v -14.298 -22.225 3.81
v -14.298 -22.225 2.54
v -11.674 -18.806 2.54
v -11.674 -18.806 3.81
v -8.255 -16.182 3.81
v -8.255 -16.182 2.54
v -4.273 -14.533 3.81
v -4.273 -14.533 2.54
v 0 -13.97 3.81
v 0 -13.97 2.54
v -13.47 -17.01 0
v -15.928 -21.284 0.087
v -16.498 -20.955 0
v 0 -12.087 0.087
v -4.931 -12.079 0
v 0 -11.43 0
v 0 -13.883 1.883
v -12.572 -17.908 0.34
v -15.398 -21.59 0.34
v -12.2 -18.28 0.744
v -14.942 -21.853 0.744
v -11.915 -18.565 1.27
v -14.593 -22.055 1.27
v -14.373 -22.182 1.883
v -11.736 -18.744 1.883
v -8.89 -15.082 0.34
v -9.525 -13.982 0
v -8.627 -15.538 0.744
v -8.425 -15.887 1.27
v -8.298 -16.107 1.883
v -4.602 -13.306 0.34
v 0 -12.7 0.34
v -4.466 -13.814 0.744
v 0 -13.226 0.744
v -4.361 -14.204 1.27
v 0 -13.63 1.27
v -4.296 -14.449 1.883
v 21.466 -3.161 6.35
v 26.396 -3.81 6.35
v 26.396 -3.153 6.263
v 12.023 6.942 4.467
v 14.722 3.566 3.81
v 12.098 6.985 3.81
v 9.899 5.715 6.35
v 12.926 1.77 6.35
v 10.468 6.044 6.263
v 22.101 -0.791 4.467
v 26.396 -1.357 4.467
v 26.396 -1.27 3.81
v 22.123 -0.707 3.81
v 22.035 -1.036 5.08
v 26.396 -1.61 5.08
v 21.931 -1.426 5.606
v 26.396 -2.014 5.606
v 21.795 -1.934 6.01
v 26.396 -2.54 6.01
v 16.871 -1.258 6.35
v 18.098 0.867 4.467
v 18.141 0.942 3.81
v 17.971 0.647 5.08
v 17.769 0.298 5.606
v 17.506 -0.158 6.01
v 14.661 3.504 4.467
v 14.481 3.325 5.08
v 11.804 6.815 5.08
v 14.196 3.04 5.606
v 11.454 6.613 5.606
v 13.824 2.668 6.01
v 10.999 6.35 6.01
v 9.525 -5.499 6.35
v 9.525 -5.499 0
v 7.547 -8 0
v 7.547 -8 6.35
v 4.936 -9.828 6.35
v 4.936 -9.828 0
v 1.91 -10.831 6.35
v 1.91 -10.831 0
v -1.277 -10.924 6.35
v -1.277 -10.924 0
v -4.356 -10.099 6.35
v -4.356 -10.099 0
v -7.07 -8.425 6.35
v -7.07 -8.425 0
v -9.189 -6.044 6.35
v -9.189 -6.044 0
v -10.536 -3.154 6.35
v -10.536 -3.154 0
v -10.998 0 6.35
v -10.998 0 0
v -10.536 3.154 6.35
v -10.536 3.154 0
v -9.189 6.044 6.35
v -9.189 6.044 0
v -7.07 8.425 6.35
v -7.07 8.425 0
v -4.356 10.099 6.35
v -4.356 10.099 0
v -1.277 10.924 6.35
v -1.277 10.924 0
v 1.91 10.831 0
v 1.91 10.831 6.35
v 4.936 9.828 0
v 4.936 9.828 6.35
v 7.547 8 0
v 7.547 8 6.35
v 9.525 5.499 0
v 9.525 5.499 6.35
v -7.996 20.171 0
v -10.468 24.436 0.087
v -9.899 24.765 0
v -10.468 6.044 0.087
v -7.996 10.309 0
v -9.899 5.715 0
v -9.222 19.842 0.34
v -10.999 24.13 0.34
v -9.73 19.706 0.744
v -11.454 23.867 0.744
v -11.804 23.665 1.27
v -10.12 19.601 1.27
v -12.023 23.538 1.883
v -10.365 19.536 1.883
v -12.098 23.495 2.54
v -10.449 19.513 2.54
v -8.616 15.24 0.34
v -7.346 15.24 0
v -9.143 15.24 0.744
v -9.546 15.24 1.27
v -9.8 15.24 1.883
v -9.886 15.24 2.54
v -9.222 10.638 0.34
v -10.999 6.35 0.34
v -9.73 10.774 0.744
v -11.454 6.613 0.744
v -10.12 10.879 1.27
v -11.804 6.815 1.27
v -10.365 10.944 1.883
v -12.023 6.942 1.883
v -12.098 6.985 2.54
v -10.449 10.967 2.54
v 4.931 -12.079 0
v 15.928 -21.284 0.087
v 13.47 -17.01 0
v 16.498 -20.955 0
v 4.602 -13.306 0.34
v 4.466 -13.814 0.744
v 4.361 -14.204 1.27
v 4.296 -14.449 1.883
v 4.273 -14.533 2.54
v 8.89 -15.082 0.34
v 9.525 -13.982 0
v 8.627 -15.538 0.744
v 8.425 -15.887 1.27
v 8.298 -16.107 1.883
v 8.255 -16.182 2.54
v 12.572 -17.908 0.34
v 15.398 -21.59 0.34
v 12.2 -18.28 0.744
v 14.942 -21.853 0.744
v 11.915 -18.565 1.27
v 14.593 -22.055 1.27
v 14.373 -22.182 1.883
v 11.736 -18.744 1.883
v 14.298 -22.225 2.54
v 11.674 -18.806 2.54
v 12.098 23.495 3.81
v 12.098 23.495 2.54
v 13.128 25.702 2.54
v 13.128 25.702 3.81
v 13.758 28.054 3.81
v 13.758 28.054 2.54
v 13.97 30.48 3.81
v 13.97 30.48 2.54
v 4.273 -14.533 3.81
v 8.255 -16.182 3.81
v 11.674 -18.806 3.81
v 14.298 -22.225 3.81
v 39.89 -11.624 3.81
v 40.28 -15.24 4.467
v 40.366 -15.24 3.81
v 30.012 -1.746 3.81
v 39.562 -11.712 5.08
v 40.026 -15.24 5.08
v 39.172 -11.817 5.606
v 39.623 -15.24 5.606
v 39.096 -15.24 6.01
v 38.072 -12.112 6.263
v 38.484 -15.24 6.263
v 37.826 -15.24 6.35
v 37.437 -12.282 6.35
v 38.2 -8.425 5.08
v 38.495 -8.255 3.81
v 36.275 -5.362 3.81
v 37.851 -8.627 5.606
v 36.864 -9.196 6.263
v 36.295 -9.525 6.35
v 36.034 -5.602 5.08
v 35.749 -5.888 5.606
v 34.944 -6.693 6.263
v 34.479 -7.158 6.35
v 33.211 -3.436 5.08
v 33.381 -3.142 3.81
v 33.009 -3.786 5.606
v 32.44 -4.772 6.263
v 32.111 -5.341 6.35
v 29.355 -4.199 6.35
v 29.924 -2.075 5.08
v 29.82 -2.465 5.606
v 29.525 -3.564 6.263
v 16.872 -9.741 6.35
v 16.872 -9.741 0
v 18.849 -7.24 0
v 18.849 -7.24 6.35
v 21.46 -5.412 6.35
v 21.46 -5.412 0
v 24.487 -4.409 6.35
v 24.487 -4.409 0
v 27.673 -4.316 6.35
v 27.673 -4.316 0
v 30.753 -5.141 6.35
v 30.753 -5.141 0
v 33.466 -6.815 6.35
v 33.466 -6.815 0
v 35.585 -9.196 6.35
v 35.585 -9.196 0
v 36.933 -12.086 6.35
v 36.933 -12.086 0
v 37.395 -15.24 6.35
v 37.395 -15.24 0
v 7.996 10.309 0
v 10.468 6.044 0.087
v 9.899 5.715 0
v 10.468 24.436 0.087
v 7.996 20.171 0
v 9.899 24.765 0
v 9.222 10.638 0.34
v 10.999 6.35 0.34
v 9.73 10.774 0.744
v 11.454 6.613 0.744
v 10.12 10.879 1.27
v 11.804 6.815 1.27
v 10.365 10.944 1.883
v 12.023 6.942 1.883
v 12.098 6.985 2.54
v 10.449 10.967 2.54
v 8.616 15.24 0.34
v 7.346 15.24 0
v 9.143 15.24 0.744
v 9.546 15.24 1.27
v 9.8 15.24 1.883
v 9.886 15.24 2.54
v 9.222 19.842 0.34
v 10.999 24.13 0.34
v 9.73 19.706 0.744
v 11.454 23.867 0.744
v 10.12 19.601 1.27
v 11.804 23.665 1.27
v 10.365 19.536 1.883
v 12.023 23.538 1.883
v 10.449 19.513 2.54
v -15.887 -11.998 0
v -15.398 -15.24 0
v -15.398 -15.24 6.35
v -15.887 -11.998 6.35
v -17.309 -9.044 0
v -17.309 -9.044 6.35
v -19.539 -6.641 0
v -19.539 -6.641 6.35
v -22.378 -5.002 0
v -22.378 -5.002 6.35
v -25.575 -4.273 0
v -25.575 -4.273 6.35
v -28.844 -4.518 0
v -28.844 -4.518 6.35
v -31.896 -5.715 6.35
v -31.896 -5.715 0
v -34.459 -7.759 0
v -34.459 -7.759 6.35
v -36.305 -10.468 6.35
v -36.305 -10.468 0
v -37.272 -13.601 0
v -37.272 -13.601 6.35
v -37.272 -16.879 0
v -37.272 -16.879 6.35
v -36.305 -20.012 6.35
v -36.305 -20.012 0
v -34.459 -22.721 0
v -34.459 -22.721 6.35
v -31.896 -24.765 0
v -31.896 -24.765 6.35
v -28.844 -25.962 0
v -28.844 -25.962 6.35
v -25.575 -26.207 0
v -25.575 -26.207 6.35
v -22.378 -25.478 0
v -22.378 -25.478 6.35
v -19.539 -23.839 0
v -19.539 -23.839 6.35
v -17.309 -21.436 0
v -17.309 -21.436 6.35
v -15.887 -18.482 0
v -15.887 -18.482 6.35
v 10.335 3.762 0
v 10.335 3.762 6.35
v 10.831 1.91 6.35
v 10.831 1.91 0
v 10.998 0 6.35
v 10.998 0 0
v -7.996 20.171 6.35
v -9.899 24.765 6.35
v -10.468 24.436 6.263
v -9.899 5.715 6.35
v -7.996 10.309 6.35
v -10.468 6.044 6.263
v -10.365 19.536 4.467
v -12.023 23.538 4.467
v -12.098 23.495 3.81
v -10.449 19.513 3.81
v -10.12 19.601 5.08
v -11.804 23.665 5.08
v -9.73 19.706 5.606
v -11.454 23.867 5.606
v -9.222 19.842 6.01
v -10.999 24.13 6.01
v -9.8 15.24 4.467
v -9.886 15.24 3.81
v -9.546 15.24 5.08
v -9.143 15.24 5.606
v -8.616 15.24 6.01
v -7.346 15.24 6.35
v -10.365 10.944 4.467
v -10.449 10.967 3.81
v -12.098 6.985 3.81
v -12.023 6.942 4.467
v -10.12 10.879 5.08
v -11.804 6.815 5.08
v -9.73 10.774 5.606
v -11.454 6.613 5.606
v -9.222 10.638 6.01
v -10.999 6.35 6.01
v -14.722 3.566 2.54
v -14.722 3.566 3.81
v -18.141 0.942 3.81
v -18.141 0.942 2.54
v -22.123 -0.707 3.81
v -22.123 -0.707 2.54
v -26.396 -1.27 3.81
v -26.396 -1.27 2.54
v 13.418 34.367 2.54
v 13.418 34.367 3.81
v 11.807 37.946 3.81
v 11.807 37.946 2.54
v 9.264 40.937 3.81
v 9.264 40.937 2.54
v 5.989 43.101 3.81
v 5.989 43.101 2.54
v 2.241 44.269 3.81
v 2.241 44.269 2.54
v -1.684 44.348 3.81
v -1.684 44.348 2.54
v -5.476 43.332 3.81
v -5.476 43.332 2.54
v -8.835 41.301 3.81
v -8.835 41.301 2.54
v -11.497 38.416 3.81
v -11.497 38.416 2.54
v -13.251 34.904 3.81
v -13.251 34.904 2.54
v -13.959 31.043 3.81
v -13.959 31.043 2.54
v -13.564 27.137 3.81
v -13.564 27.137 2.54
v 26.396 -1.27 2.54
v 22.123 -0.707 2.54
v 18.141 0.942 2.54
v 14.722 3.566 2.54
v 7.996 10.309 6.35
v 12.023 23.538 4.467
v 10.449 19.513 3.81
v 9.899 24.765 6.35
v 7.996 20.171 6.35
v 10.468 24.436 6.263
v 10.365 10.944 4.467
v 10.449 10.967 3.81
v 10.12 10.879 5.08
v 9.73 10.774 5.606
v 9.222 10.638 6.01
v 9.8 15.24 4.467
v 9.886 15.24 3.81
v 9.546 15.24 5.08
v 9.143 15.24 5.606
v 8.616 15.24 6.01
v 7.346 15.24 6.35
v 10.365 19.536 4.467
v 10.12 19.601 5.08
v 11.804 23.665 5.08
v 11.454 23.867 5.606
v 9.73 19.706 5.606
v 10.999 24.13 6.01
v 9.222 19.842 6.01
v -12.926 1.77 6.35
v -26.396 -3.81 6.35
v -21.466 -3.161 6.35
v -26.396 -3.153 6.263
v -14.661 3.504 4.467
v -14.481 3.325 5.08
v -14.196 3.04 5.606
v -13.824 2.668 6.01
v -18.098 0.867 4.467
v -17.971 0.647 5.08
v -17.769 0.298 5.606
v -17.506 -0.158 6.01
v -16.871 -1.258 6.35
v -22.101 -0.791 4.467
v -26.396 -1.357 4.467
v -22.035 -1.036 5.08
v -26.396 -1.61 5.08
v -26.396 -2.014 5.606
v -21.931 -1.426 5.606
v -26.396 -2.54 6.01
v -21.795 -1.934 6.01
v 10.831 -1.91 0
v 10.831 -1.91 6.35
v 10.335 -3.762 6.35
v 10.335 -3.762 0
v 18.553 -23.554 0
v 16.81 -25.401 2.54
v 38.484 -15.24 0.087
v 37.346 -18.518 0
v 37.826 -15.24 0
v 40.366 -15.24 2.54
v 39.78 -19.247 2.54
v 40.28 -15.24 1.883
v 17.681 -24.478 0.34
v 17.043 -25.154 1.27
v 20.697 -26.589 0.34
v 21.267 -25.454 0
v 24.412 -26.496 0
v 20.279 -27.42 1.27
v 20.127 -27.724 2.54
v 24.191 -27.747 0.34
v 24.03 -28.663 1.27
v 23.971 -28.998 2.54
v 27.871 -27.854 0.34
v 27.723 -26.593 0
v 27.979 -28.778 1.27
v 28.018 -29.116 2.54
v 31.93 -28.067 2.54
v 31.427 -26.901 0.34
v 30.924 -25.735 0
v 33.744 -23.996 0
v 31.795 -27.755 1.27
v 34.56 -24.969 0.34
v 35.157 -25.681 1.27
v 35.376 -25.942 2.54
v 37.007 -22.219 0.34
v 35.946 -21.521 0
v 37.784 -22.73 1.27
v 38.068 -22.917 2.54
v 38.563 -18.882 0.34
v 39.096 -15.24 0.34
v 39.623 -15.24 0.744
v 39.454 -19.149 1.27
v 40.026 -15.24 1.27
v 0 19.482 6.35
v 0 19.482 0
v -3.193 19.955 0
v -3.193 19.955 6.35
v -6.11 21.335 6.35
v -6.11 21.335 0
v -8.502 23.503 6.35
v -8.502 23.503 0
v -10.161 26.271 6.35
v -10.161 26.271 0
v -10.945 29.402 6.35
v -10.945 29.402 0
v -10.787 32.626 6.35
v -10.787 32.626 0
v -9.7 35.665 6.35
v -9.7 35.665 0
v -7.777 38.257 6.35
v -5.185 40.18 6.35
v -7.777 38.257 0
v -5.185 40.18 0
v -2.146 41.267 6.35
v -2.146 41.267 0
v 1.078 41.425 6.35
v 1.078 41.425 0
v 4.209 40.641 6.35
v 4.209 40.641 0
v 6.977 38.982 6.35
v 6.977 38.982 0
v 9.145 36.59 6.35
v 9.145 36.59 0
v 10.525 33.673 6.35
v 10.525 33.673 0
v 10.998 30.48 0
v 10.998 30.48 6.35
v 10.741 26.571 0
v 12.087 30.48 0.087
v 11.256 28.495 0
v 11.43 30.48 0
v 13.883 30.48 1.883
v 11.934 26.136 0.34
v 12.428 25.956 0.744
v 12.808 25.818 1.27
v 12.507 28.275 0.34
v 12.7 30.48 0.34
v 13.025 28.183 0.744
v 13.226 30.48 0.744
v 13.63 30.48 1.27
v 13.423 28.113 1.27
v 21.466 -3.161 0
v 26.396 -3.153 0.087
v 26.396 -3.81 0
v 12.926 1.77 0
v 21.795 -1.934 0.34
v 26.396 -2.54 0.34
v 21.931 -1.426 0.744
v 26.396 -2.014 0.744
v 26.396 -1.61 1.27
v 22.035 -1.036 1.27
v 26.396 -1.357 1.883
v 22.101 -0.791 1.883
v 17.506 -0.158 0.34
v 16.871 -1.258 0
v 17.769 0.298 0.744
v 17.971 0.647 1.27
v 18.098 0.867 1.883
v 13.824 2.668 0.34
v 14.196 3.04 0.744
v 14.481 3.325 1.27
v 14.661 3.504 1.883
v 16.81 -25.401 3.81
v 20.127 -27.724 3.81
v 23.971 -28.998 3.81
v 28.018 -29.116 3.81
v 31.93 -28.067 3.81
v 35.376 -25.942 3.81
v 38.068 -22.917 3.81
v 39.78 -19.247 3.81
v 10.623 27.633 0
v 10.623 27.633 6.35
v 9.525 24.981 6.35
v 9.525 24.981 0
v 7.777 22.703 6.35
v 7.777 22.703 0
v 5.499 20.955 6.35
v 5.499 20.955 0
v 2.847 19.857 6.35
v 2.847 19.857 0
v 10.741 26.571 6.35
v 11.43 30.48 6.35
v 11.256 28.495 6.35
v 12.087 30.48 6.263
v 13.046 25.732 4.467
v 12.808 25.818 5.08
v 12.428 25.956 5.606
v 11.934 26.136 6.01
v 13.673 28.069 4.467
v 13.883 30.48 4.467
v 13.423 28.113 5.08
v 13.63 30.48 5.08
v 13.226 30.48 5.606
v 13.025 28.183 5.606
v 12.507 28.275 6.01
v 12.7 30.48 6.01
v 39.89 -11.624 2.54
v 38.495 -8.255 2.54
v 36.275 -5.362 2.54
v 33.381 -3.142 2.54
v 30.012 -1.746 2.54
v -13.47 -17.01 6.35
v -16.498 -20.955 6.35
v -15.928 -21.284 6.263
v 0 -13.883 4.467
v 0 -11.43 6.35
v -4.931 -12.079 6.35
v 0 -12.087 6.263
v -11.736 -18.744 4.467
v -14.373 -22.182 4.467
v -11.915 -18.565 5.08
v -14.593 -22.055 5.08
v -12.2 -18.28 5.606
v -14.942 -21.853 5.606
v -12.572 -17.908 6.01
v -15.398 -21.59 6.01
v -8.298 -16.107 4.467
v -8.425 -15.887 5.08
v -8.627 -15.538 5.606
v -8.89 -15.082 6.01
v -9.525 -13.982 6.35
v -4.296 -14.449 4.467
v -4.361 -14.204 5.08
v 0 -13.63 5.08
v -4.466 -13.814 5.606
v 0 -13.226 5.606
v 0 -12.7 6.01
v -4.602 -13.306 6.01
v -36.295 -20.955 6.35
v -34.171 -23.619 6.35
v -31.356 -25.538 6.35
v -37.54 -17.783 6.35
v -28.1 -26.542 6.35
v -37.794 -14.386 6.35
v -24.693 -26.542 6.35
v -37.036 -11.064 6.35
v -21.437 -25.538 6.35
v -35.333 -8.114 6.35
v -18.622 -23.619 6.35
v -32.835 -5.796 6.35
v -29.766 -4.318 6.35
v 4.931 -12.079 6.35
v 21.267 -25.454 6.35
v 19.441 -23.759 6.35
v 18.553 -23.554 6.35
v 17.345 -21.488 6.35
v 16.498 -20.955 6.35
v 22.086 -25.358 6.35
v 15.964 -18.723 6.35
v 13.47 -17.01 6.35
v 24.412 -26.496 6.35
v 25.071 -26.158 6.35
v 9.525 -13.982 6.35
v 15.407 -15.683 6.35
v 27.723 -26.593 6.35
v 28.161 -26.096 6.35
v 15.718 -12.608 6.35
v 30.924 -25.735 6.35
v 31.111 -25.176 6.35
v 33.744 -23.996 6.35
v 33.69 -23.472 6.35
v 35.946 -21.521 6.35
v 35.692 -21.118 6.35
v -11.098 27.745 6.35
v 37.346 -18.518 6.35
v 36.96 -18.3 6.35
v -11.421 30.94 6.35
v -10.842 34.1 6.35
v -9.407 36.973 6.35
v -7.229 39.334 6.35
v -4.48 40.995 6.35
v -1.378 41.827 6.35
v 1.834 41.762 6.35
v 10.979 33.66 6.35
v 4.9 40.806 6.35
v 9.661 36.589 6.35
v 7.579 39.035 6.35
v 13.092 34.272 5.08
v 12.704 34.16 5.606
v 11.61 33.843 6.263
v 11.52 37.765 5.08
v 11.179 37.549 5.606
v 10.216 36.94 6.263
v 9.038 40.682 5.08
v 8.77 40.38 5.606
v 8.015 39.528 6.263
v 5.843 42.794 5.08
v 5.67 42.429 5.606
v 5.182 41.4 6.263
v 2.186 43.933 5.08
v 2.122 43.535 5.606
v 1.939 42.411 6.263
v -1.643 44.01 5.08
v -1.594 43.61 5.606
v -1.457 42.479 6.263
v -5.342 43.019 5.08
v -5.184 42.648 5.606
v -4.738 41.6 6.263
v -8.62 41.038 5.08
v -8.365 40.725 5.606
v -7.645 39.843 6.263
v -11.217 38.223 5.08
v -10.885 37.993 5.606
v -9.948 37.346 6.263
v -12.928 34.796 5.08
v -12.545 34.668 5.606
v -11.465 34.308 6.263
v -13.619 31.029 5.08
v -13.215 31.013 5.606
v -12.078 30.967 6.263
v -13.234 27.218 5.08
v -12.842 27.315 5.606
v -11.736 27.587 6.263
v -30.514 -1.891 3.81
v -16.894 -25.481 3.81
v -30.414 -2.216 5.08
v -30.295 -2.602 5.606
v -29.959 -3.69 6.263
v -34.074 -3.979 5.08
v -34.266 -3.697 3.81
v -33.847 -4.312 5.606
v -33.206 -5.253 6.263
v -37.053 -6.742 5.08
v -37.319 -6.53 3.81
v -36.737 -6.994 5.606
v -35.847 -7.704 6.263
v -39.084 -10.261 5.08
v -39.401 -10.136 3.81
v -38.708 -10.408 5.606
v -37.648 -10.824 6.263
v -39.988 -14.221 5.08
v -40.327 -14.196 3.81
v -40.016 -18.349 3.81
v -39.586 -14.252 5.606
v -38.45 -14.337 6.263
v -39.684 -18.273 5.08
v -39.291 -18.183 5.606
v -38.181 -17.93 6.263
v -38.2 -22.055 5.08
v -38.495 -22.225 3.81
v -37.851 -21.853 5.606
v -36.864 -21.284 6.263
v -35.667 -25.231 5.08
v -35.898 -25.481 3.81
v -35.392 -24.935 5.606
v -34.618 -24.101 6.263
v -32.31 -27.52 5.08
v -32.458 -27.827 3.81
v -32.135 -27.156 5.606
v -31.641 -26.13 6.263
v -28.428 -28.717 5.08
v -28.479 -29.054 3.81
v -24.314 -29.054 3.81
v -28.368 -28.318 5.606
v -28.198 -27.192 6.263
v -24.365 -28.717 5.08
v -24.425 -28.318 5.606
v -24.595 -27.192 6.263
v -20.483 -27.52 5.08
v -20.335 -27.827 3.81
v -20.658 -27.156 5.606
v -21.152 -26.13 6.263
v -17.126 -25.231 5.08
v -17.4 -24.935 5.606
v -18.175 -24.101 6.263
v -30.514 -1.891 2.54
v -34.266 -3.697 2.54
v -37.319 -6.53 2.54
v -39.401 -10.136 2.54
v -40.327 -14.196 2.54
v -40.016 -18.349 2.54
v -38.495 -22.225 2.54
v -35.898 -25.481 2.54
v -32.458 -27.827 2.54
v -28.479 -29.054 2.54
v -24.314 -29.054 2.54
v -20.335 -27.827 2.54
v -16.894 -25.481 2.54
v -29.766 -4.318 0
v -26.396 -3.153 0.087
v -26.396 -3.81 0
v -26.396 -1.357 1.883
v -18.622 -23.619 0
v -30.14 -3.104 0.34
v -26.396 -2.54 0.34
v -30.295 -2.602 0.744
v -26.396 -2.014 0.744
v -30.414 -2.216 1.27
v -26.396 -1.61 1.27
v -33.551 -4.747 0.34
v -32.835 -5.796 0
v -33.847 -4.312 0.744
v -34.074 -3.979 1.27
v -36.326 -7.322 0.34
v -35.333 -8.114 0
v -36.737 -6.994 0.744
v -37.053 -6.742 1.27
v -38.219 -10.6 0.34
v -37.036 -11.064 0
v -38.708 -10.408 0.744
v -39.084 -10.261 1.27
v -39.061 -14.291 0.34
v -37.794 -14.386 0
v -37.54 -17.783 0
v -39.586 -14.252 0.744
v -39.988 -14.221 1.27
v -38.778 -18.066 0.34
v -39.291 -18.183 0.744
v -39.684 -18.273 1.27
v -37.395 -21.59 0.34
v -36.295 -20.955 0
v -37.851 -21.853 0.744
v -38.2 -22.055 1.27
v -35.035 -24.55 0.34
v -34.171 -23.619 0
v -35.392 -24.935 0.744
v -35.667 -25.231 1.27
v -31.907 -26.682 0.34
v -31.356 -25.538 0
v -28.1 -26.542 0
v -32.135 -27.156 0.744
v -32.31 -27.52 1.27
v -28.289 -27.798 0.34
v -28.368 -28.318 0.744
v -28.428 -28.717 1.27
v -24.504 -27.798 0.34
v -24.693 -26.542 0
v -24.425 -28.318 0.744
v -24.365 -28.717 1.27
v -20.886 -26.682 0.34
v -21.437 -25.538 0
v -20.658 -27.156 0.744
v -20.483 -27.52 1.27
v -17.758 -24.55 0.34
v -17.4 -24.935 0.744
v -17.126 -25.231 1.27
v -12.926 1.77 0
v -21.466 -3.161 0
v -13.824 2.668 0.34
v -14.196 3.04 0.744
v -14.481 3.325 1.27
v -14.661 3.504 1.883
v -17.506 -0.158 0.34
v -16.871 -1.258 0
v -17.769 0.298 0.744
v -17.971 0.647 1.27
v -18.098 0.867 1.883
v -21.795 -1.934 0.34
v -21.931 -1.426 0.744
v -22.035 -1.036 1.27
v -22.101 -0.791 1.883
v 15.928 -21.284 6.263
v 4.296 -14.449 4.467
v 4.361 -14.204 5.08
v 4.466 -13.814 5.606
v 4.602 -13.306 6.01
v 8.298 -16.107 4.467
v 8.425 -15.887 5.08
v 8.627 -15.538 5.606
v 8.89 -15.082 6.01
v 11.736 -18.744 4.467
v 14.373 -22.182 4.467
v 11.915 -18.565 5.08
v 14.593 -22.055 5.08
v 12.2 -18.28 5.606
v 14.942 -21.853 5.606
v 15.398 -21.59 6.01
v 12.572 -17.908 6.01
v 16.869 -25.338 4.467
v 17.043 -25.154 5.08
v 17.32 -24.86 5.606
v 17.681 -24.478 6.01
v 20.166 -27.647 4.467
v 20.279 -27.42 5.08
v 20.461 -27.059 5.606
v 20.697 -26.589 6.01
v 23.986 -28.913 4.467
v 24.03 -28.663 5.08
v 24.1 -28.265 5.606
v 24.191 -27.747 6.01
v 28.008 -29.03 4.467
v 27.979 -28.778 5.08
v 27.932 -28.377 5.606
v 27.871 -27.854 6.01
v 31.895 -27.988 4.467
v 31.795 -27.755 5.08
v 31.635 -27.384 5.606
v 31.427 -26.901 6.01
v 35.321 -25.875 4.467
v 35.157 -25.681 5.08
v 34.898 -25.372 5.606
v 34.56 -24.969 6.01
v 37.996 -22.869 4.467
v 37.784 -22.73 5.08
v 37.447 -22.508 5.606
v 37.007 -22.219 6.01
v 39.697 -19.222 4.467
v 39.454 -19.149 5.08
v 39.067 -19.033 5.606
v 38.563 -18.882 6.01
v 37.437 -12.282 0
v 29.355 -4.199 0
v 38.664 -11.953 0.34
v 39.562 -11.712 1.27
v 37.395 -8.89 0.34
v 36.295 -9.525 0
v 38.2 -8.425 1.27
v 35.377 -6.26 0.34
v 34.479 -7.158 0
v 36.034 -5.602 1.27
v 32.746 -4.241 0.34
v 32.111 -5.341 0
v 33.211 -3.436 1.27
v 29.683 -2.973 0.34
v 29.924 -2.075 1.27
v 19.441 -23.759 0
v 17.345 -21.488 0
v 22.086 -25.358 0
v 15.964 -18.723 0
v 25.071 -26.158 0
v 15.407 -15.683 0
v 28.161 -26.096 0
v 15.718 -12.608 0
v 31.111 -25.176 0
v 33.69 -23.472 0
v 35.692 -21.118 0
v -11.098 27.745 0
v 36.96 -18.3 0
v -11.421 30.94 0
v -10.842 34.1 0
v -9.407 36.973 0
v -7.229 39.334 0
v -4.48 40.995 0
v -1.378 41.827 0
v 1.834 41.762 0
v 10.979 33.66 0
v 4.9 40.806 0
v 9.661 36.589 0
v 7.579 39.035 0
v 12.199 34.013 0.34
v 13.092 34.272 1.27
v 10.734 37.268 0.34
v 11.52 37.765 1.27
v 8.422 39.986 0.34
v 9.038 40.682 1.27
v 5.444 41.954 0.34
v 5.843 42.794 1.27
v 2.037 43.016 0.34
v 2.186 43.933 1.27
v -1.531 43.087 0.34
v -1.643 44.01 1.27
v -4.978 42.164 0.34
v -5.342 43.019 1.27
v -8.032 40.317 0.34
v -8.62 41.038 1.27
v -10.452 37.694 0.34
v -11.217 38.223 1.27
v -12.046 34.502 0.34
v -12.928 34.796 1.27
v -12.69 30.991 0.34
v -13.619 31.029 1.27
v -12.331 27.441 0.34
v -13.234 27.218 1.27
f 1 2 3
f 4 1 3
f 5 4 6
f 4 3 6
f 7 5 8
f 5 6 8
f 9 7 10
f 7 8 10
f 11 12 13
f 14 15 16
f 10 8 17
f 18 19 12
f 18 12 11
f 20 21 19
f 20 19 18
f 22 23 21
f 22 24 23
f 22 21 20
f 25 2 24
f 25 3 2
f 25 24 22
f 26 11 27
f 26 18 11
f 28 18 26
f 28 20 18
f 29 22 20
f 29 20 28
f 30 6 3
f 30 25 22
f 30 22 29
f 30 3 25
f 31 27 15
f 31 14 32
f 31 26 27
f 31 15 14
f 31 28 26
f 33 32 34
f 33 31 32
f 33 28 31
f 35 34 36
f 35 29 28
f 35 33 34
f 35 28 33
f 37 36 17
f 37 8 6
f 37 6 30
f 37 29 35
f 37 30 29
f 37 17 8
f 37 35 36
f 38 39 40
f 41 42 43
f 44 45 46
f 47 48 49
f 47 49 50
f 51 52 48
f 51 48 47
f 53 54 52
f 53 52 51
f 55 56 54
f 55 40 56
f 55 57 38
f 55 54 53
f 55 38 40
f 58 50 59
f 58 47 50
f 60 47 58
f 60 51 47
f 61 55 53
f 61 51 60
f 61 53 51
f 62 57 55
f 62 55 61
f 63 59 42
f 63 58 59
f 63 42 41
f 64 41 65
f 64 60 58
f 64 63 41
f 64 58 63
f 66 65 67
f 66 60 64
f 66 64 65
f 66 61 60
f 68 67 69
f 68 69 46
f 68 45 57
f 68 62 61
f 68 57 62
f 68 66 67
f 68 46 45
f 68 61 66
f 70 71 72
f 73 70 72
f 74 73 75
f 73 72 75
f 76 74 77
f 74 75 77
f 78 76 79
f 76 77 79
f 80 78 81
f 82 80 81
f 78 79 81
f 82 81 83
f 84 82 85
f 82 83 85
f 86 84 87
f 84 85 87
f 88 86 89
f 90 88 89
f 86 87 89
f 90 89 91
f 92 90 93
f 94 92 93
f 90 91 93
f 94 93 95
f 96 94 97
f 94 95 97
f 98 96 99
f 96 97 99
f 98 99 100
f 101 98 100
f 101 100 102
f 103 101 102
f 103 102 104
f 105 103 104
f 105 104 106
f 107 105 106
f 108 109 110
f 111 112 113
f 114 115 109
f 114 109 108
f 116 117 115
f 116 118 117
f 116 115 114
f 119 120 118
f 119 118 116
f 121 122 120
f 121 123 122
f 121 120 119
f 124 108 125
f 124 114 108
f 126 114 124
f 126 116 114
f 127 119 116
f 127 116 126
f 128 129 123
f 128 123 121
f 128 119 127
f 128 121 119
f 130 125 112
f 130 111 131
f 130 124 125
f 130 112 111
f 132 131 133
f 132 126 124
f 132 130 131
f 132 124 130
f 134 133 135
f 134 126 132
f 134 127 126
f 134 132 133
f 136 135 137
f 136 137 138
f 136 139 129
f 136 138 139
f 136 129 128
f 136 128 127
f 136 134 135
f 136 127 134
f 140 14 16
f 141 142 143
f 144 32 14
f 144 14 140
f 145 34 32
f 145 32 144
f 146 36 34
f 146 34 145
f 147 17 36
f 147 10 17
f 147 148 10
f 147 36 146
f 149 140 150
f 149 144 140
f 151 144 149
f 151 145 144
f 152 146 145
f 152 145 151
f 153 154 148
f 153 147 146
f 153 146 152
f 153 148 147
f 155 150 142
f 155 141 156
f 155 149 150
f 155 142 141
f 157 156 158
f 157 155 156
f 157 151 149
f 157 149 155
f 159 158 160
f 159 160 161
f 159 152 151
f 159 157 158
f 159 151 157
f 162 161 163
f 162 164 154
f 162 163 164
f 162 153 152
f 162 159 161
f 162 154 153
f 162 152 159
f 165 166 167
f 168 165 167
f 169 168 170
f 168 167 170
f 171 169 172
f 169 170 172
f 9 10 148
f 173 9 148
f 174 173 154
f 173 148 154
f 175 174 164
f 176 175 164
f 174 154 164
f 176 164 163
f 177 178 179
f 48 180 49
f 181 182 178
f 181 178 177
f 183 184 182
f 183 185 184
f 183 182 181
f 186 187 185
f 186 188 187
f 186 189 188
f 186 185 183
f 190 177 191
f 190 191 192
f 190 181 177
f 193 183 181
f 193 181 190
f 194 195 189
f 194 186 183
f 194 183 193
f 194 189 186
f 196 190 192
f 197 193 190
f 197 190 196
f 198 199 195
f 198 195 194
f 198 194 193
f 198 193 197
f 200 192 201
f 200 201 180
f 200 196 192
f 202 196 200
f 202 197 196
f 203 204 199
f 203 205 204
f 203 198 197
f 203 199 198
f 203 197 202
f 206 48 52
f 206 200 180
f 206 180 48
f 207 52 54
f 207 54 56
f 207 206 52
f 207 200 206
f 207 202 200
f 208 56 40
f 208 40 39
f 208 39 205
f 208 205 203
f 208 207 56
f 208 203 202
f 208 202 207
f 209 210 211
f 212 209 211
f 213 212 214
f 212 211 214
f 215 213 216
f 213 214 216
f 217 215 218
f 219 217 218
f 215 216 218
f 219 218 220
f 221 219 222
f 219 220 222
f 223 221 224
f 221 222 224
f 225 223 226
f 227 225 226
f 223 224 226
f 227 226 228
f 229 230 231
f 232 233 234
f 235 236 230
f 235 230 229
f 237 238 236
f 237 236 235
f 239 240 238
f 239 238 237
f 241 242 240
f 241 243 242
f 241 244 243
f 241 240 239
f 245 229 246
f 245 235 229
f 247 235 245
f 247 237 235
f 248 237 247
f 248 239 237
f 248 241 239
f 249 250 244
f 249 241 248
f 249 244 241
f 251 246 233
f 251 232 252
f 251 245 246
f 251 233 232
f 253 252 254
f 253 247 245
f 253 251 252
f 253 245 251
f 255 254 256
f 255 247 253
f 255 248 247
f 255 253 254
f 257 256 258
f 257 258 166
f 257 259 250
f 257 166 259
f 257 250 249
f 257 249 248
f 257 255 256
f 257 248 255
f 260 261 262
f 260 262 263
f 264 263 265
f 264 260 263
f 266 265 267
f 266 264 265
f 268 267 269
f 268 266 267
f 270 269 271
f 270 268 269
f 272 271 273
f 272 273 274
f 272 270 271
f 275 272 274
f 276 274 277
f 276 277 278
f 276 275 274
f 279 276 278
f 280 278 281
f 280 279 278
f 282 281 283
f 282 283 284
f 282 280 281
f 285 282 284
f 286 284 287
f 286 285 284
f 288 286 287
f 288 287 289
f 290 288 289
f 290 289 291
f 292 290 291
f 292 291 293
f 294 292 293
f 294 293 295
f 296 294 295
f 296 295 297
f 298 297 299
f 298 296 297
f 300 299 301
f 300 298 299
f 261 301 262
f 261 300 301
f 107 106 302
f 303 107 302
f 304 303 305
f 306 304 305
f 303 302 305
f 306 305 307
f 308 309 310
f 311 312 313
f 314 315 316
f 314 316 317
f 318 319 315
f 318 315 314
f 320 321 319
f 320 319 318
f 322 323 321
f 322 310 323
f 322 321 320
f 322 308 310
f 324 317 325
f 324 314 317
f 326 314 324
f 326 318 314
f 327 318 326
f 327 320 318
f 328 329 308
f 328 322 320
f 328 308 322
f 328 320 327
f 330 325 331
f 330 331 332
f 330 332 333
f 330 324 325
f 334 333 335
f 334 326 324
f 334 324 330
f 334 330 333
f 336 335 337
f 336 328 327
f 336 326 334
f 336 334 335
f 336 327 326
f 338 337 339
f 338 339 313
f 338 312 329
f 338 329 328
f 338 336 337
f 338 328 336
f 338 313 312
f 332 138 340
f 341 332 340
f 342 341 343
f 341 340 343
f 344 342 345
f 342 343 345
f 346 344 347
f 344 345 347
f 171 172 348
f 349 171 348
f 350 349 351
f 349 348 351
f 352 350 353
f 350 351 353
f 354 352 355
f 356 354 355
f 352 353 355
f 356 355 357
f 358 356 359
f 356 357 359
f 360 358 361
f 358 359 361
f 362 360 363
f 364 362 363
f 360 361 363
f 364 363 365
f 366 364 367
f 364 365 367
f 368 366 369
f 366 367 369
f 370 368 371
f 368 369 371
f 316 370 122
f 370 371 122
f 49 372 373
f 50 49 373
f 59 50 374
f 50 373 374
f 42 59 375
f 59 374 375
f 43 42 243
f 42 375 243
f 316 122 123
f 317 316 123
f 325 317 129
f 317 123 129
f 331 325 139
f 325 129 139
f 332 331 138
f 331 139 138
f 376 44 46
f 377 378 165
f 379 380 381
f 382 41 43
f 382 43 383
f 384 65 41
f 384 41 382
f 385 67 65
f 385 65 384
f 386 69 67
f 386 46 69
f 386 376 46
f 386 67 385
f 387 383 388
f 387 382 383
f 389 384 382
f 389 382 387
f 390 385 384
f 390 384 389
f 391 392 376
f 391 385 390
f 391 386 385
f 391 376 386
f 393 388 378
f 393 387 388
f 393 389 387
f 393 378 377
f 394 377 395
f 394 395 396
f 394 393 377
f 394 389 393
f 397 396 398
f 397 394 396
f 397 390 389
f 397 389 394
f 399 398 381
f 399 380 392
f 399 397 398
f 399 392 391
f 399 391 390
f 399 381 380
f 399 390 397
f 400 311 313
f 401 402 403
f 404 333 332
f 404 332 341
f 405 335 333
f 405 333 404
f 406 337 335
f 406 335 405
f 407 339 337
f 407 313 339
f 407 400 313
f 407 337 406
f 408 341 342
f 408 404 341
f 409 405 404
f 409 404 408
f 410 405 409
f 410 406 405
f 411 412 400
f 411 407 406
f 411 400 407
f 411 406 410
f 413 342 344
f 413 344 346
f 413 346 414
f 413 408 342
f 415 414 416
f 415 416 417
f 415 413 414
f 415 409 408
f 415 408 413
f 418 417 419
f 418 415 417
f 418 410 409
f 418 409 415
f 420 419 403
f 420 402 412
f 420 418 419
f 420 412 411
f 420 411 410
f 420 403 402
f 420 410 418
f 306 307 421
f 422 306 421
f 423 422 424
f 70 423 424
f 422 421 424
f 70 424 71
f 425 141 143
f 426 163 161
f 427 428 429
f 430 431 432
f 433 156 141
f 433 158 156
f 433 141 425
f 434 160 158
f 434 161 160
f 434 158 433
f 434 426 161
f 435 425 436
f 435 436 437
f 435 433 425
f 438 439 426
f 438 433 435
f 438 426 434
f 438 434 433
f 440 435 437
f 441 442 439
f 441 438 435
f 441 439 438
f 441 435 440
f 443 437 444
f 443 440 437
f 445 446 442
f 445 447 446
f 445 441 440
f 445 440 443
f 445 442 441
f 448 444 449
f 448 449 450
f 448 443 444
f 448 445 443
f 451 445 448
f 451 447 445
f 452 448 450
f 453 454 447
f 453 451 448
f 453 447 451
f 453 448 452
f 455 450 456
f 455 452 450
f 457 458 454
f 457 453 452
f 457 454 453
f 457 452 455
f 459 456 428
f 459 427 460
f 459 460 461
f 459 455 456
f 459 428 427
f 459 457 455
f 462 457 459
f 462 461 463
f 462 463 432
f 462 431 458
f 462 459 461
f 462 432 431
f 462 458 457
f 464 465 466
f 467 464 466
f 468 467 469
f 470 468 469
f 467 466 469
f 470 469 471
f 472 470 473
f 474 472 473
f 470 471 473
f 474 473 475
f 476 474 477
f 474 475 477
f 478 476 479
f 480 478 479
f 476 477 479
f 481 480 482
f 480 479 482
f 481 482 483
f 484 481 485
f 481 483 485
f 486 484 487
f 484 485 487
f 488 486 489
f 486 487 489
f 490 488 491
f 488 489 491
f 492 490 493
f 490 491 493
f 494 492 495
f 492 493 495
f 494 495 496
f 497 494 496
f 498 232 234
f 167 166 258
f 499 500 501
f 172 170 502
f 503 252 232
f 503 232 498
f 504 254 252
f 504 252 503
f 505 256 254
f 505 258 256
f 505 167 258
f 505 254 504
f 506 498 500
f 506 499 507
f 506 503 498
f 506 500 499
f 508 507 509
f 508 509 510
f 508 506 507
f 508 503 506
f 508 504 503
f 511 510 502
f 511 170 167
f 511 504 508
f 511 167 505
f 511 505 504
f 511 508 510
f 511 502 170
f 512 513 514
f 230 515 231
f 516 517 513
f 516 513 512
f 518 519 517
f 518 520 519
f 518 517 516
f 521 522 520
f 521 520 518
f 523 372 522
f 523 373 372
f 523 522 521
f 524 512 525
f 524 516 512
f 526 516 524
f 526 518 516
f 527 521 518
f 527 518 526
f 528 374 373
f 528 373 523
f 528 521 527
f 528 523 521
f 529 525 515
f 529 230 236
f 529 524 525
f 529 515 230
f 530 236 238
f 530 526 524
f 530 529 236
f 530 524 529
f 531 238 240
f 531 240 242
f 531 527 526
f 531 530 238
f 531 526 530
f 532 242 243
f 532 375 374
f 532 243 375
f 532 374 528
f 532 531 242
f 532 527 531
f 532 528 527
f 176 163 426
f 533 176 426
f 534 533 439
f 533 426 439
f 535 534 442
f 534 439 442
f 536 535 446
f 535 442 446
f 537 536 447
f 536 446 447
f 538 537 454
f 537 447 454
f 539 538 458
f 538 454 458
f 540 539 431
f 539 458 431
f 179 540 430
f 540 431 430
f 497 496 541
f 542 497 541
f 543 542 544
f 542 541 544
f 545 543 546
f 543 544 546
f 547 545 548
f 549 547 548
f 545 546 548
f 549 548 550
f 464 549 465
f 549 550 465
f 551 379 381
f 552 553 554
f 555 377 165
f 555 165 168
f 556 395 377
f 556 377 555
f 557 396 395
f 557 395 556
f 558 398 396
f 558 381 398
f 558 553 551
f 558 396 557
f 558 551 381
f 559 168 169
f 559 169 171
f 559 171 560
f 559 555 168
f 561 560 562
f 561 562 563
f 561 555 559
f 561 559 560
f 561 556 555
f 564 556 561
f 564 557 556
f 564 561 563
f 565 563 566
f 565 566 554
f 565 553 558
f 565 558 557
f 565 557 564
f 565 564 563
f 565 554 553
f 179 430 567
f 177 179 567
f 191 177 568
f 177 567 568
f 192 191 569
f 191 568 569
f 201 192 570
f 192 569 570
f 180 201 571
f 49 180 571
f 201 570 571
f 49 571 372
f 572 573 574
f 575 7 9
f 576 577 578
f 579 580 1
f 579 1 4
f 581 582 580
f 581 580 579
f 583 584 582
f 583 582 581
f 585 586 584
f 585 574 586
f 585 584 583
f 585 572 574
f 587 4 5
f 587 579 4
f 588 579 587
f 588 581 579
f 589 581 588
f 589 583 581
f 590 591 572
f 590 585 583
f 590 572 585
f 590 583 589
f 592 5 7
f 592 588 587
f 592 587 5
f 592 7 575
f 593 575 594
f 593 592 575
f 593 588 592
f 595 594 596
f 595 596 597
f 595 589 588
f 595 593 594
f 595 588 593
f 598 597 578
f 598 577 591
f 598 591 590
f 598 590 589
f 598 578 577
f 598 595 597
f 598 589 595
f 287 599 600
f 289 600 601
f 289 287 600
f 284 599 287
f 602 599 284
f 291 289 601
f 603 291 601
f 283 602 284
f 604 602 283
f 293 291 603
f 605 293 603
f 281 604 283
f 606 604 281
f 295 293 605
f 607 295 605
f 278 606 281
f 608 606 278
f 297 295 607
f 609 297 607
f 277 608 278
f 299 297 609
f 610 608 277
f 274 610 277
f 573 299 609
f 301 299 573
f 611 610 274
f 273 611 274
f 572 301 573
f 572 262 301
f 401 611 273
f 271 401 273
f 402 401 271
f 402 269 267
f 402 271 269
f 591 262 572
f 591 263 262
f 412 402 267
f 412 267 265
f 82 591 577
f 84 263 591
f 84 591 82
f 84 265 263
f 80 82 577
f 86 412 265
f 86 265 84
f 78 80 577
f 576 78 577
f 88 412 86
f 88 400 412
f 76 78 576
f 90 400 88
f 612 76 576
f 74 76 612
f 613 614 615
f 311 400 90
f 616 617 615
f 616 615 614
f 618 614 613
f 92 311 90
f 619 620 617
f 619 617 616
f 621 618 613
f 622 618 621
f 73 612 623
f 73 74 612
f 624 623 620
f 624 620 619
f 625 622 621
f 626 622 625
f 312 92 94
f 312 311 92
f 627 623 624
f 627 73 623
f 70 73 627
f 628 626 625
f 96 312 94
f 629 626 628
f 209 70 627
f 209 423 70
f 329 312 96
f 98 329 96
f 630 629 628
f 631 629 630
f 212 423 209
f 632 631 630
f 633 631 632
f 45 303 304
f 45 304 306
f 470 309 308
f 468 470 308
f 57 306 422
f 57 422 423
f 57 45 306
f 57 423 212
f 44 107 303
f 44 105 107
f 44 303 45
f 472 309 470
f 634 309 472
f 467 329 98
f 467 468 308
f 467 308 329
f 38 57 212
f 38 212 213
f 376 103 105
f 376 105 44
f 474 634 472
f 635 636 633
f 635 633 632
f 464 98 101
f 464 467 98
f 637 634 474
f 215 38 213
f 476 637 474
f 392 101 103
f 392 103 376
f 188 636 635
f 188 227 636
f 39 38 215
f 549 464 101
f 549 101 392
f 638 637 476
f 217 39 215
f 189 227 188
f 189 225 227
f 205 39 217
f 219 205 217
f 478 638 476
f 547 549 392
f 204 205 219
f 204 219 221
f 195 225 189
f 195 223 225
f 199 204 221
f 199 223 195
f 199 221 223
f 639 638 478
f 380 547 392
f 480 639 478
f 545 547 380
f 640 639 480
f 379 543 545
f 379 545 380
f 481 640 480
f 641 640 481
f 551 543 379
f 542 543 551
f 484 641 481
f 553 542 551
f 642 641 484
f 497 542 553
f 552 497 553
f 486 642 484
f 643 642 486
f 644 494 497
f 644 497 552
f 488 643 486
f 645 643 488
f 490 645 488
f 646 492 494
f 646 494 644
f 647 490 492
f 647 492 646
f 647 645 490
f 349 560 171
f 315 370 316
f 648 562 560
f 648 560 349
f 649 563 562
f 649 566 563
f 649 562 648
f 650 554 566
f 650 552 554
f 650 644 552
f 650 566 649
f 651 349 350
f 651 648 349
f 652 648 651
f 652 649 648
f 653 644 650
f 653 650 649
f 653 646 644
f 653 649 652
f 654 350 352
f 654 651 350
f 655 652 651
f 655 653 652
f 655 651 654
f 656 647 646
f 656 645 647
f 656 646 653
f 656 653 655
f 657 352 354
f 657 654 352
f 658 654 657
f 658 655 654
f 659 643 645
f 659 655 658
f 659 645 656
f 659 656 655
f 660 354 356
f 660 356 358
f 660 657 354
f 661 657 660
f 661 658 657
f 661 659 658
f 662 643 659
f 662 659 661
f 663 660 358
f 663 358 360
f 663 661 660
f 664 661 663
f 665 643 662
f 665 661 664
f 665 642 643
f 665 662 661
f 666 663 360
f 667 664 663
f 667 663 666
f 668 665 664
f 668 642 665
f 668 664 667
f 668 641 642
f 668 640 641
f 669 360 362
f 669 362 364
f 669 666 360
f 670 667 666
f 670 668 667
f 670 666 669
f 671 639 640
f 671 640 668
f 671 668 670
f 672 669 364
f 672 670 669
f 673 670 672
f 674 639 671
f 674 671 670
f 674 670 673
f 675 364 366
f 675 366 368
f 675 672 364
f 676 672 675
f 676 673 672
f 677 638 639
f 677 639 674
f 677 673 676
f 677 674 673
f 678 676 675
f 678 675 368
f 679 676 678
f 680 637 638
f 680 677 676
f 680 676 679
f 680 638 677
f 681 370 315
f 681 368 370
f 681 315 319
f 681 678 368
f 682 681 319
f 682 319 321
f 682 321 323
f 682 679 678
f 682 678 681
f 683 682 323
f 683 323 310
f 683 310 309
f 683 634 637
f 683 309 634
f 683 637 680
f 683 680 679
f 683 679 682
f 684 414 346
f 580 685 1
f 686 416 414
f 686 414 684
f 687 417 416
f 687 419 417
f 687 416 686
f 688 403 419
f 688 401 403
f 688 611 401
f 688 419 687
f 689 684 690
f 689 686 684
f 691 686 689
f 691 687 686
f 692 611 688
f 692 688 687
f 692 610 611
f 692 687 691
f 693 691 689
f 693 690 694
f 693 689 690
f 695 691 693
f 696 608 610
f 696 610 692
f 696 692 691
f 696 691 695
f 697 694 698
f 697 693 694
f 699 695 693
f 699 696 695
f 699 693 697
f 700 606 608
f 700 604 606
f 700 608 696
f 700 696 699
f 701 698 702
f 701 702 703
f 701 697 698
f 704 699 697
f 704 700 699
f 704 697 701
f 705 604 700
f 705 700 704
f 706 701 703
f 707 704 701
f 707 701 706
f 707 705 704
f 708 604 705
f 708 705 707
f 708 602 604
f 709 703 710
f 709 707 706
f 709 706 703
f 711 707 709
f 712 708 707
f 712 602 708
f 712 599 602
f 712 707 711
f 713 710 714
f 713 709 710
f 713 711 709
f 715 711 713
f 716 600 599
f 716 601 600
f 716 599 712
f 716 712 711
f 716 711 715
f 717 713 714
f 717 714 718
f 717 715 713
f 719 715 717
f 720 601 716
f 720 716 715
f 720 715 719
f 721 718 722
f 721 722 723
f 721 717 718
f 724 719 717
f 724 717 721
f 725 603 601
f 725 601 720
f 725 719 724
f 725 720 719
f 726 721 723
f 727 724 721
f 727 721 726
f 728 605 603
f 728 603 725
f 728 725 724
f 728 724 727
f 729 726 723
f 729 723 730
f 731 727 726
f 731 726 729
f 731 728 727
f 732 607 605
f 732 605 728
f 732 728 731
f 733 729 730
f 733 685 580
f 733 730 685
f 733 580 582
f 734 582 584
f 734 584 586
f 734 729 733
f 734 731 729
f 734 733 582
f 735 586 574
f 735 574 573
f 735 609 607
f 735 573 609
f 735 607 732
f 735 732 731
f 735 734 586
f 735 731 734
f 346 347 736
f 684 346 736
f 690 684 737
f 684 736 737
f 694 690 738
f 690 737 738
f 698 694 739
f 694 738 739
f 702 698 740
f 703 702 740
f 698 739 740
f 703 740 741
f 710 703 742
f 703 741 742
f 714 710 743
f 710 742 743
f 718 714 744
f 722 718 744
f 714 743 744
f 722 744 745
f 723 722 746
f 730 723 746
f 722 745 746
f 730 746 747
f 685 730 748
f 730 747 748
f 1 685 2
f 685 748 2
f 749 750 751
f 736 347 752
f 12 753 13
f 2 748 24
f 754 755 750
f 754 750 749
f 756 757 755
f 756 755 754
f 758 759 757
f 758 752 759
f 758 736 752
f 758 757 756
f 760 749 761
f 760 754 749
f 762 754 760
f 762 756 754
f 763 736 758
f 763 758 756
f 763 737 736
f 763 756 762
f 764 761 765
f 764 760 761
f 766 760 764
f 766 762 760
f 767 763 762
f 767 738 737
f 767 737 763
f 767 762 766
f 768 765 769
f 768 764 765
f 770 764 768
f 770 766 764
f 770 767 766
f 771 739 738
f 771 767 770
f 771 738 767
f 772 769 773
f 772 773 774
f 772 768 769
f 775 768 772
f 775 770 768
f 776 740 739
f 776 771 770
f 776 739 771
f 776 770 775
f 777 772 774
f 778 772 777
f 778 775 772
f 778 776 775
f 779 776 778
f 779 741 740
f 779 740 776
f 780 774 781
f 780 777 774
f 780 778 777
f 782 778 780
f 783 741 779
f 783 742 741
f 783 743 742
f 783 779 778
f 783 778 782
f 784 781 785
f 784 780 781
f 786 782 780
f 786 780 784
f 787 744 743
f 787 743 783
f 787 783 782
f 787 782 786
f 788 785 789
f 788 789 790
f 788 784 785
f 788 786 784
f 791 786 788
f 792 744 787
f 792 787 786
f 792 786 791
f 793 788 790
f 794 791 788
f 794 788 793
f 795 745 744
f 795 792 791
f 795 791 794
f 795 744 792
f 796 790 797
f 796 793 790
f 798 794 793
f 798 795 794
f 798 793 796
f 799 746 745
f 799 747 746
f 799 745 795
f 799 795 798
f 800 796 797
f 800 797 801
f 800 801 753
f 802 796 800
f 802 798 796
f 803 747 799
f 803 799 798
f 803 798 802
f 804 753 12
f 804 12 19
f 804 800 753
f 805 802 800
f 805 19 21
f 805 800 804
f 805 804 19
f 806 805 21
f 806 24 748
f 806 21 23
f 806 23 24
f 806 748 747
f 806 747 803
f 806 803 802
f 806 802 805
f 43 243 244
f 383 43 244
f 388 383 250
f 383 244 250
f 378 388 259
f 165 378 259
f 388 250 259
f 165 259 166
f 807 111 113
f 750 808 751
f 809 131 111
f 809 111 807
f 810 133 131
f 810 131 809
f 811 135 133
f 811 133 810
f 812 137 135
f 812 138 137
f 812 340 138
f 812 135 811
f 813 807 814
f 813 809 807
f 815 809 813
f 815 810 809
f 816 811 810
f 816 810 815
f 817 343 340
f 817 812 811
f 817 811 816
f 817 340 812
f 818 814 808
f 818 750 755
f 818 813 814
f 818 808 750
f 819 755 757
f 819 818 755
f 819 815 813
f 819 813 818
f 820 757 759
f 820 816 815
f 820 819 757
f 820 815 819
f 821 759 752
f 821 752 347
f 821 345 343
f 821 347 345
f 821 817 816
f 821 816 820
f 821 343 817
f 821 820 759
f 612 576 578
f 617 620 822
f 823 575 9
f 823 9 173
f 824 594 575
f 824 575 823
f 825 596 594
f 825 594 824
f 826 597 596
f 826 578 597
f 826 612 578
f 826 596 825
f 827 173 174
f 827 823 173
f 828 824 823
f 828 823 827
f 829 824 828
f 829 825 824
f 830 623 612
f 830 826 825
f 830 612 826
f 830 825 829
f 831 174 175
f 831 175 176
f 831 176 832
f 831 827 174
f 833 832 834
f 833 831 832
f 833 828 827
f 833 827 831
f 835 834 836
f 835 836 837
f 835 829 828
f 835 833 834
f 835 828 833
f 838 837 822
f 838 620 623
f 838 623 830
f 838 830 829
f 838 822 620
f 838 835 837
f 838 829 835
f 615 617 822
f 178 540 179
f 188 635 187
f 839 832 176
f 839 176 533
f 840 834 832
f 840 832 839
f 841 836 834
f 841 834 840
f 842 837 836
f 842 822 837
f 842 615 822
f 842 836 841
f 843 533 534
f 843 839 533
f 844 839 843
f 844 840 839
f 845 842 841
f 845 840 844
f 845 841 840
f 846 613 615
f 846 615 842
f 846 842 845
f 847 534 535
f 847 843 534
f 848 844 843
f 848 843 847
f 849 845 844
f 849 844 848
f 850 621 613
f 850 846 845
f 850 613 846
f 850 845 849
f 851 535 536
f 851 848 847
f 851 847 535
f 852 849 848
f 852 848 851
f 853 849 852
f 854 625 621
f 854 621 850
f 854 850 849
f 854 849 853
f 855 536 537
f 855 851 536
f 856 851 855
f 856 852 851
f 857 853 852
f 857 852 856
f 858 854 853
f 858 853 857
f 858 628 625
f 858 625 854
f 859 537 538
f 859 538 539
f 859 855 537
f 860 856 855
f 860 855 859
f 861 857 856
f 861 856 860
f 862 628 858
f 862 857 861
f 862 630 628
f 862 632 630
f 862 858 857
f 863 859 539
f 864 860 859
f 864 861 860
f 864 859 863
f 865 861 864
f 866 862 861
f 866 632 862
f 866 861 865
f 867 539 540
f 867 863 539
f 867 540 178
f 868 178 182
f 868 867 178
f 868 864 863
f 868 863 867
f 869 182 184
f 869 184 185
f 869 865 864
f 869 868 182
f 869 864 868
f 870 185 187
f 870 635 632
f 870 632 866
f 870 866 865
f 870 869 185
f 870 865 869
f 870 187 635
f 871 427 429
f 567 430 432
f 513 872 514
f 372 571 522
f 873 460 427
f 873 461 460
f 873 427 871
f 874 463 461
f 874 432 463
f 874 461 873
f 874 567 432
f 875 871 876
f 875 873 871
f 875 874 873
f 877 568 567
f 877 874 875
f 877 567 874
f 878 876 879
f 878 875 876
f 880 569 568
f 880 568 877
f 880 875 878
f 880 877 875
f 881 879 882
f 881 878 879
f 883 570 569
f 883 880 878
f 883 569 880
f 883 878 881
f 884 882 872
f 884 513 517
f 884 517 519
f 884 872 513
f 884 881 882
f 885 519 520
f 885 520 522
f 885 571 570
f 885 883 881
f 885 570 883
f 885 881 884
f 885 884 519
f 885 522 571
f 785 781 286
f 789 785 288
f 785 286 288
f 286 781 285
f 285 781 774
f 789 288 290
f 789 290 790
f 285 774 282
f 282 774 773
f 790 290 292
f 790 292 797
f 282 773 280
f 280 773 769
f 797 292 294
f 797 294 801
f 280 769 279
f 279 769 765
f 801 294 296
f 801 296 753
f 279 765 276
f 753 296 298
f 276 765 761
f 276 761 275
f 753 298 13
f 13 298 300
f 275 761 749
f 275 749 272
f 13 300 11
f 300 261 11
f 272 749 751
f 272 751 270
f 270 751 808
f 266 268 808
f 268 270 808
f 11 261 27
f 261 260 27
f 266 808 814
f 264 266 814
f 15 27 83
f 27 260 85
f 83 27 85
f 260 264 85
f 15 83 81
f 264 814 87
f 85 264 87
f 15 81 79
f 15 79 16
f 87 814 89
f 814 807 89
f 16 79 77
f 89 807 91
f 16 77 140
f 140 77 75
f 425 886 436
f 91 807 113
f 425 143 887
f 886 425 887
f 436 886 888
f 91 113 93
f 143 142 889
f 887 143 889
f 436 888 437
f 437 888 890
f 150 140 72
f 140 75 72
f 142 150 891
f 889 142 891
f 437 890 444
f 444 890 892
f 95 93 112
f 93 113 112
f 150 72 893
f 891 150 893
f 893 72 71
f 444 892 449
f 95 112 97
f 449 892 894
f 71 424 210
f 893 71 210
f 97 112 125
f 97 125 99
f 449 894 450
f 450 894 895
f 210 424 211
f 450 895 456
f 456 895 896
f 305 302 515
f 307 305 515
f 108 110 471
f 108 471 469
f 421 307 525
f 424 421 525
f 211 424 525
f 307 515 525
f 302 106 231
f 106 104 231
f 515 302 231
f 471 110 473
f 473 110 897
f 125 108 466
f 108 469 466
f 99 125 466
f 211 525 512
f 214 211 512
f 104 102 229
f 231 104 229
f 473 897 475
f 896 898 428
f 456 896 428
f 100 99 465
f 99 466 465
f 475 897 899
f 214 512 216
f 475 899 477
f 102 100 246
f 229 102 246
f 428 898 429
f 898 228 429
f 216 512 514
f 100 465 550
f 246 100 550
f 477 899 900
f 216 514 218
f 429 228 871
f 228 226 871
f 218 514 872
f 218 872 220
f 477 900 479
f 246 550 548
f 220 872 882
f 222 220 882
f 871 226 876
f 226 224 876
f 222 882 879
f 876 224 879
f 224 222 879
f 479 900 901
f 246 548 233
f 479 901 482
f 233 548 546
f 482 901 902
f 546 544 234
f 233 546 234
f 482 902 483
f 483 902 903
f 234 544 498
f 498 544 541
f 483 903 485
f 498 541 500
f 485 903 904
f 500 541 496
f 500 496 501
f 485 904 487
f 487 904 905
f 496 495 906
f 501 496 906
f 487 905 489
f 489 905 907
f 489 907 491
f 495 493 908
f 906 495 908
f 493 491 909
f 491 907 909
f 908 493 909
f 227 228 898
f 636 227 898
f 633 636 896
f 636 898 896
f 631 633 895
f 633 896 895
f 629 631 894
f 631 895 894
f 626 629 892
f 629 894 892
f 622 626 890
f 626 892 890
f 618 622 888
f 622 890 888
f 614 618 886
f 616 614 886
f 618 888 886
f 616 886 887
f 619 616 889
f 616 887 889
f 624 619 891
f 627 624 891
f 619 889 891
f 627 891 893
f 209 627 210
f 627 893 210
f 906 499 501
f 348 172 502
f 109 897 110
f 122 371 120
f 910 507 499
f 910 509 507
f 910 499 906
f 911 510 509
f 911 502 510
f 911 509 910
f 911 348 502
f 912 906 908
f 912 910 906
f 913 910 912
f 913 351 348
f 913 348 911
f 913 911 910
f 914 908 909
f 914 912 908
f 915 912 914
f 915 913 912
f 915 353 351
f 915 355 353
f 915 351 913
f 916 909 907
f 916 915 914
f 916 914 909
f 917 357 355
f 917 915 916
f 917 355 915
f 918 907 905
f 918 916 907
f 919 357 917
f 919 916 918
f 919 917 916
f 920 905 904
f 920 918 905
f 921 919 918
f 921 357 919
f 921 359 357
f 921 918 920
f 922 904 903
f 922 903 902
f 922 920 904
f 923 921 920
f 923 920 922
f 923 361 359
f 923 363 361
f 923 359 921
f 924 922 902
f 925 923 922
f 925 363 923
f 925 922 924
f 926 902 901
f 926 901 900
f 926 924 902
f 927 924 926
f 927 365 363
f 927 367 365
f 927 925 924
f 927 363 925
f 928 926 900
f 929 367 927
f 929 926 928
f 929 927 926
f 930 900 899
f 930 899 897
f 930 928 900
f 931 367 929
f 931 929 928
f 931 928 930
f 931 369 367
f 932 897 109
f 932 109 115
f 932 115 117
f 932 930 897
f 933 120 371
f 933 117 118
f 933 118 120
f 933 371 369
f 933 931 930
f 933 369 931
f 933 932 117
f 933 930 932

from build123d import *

# Parameters (mm, degrees)
F0_R     = 10.9982
F1_DEPTH = 6.35
F2_R     = 2.54
F3_R     = 2.54


with BuildPart() as f1:
    # F0 (on Top) → F1 (new body)
    with BuildSketch(Plane.XY):
        with BuildLine():
            ThreePointArc((9.5247205959, 5.4991), (10.6234454227, 2.8465436218), (10.9982, 0))
            ThreePointArc((10.9982, 0), (10.6234454227, -2.8465436218), (9.5247205959, -5.4991))
            Line((9.5247205959, -5.4991), (12.0983748909, -6.985))
            ThreePointArc((12.0983748909, -6.985), (13.4939837933, -3.6157020601), (13.97, 0))
            ThreePointArc((13.97, 0), (13.4939837933, 3.6157020601), (12.0983748909, 6.985))
            Line((12.0983748909, 6.985), (9.5247205959, 5.4991))
        make_face()
        with BuildLine():
            ThreePointArc((0, 10.9982), (5.4991, 9.5247205959), (9.5247205959, 5.4991))
            Line((9.5247205959, 5.4991), (12.0983748909, 6.985))
            ThreePointArc((12.0983748909, 6.985), (6.985, 12.0983748909), (0, 13.97))
            Line((0, 13.97), (0, 10.9982))
        make_face()
        with BuildLine():
            Line((12.0983748909, -6.985), (9.5247205959, -5.4991))
            ThreePointArc((9.5247205959, -5.4991), (-9.5247205959, -5.4991), (0, 10.9982))
            Line((0, 10.9982), (0, 13.97))
            ThreePointArc((0, 13.97), (-6.985, 12.0983748909), (-12.0983748909, 6.985))
            ThreePointArc((-12.0983748909, 6.985), (-12.0983748909, -6.985), (0, -13.97))
            ThreePointArc((0, -13.97), (6.985, -12.0983748909), (12.0983748909, -6.985))
        make_face()
        with BuildLine():
            ThreePointArc((26.3964543073, -1.27), (18.1414543073, 0.9419205835), (12.0983748909, 6.985))
            ThreePointArc((12.0983748909, 6.985), (13.4939837933, 3.6157020601), (13.97, 0))
            ThreePointArc((13.97, 0), (13.4939837933, -3.6157020601), (12.0983748909, -6.985))
            Line((12.0983748909, -6.985), (14.2980794165, -8.255))
            ThreePointArc((14.2980794165, -8.255), (19.4114543073, -3.1416251091), (26.3964543073, -1.27))
        make_face()
        with BuildLine():
            ThreePointArc((0, 13.97), (6.985, 12.0983748909), (12.0983748909, 6.985))
            ThreePointArc((12.0983748909, 6.985), (9.8864543073, 15.24), (12.0983748909, 23.495))
            ThreePointArc((12.0983748909, 23.495), (6.985, 18.3816251091), (0, 16.51))
            Line((0, 16.51), (0, 13.97))
        make_face()
        with BuildLine():
            Line((14.2980794165, -8.255), (12.0983748909, -6.985))
            ThreePointArc((12.0983748909, -6.985), (6.985, -12.0983748909), (0, -13.97))
            ThreePointArc((0, -13.97), (8.255, -16.1819205835), (14.2980794165, -22.225))
            ThreePointArc((14.2980794165, -22.225), (12.4264543073, -15.24), (14.2980794165, -8.255))
        make_face()
        with BuildLine():
            ThreePointArc((-12.0983748909, 6.985), (-6.985, 12.0983748909), (0, 13.97))
            Line((0, 13.97), (0, 16.51))
            ThreePointArc((0, 16.51), (-6.985, 18.3816251091), (-12.0983748909, 23.495))
            ThreePointArc((-12.0983748909, 23.495), (-9.8864543073, 15.24), (-12.0983748909, 6.985))
        make_face()
        with BuildLine():
            ThreePointArc((0, 16.51), (6.985, 18.3816251091), (12.0983748909, 23.495))
            ThreePointArc((12.0983748909, 23.495), (13.4939837933, 26.8642979399), (13.97, 30.48))
            ThreePointArc((13.97, 30.48), (-3.6157020601, 43.9739837933), (-12.0983748909, 23.495))
            ThreePointArc((-12.0983748909, 23.495), (-6.985, 18.3816251091), (0, 16.51))
        make_face()
        with BuildLine():
            ThreePointArc((10.9982, 30.48), (7.7769018008, 22.7030981992), (0, 19.4818))
            ThreePointArc((0, 19.4818), (-7.7769018008, 38.2569018008), (10.9982, 30.48))
        make_face(mode=Mode.SUBTRACT)
        with BuildLine():
            ThreePointArc((40.3664543073, -15.24), (36.2747360405, -5.3617182668), (26.3964543073, -1.27))
            ThreePointArc((26.3964543073, -1.27), (19.4114543073, -3.1416251091), (14.2980794165, -8.255))
            ThreePointArc((14.2980794165, -8.255), (12.4264543073, -15.24), (14.2980794165, -22.225))
            ThreePointArc((14.2980794165, -22.225), (30.0121563674, -28.7339837933), (40.3664543073, -15.24))
        make_face()
        with BuildLine():
            ThreePointArc((37.3946543073, -15.24), (23.5499106855, -25.8634454227), (16.8717337114, -9.7409))
            ThreePointArc((16.8717337114, -9.7409), (29.2429979292, -4.6165545773), (37.3946543073, -15.24))
        make_face(mode=Mode.SUBTRACT)
        with BuildLine():
            ThreePointArc((-14.2980794165, -22.225), (-8.255, -16.1819205835), (0, -13.97))
            ThreePointArc((0, -13.97), (-12.0983748909, -6.985), (-12.0983748909, 6.985))
            ThreePointArc((-12.0983748909, 6.985), (-18.1414543073, 0.9419205835), (-26.3964543073, -1.27))
            ThreePointArc((-26.3964543073, -1.27), (-16.5181725742, -5.3617182668), (-12.4264543073, -15.24))
            ThreePointArc((-12.4264543073, -15.24), (-12.9024705141, -18.8557020601), (-14.2980794165, -22.225))
        make_face()
        with BuildLine():
            ThreePointArc((-26.3964543073, -1.27), (-38.4948291982, -22.225), (-14.2980794165, -22.225))
            ThreePointArc((-14.2980794165, -22.225), (-12.9024705141, -18.8557020601), (-12.4264543073, -15.24))
            ThreePointArc((-12.4264543073, -15.24), (-16.5181725742, -5.3617182668), (-26.3964543073, -1.27))
        make_face()
        with Locations((-26.3964543073, -15.24)):
            Circle(F0_R, mode=Mode.SUBTRACT)
    extrude(amount=F1_DEPTH)

    # F2
    f2_edges = [f1.edges().sort_by_distance(p)[0] for p in [
        (-38.494829, -22.225, 6.35),
        (0, -13.97, 6.35),
        (38.494829, -22.225, 6.35),
        (0, 44.45, 6.35),
        (12.098375, 6.985, 6.35),
        (-12.098375, 6.985, 6.35),
    ]]
    fillet(f2_edges, radius=F2_R)

    # F3
    f3_edges = [f1.edges().sort_by_distance(p)[0] for p in [
        (38.494829, -22.225, 0),
        (12.098375, 6.985, 0),
        (0, 44.45, 0),
        (-12.098375, 6.985, 0),
        (-38.494829, -22.225, 0),
        (0, -13.97, 0),
    ]]
    fillet(f3_edges, radius=F3_R)


solid = f1.part
